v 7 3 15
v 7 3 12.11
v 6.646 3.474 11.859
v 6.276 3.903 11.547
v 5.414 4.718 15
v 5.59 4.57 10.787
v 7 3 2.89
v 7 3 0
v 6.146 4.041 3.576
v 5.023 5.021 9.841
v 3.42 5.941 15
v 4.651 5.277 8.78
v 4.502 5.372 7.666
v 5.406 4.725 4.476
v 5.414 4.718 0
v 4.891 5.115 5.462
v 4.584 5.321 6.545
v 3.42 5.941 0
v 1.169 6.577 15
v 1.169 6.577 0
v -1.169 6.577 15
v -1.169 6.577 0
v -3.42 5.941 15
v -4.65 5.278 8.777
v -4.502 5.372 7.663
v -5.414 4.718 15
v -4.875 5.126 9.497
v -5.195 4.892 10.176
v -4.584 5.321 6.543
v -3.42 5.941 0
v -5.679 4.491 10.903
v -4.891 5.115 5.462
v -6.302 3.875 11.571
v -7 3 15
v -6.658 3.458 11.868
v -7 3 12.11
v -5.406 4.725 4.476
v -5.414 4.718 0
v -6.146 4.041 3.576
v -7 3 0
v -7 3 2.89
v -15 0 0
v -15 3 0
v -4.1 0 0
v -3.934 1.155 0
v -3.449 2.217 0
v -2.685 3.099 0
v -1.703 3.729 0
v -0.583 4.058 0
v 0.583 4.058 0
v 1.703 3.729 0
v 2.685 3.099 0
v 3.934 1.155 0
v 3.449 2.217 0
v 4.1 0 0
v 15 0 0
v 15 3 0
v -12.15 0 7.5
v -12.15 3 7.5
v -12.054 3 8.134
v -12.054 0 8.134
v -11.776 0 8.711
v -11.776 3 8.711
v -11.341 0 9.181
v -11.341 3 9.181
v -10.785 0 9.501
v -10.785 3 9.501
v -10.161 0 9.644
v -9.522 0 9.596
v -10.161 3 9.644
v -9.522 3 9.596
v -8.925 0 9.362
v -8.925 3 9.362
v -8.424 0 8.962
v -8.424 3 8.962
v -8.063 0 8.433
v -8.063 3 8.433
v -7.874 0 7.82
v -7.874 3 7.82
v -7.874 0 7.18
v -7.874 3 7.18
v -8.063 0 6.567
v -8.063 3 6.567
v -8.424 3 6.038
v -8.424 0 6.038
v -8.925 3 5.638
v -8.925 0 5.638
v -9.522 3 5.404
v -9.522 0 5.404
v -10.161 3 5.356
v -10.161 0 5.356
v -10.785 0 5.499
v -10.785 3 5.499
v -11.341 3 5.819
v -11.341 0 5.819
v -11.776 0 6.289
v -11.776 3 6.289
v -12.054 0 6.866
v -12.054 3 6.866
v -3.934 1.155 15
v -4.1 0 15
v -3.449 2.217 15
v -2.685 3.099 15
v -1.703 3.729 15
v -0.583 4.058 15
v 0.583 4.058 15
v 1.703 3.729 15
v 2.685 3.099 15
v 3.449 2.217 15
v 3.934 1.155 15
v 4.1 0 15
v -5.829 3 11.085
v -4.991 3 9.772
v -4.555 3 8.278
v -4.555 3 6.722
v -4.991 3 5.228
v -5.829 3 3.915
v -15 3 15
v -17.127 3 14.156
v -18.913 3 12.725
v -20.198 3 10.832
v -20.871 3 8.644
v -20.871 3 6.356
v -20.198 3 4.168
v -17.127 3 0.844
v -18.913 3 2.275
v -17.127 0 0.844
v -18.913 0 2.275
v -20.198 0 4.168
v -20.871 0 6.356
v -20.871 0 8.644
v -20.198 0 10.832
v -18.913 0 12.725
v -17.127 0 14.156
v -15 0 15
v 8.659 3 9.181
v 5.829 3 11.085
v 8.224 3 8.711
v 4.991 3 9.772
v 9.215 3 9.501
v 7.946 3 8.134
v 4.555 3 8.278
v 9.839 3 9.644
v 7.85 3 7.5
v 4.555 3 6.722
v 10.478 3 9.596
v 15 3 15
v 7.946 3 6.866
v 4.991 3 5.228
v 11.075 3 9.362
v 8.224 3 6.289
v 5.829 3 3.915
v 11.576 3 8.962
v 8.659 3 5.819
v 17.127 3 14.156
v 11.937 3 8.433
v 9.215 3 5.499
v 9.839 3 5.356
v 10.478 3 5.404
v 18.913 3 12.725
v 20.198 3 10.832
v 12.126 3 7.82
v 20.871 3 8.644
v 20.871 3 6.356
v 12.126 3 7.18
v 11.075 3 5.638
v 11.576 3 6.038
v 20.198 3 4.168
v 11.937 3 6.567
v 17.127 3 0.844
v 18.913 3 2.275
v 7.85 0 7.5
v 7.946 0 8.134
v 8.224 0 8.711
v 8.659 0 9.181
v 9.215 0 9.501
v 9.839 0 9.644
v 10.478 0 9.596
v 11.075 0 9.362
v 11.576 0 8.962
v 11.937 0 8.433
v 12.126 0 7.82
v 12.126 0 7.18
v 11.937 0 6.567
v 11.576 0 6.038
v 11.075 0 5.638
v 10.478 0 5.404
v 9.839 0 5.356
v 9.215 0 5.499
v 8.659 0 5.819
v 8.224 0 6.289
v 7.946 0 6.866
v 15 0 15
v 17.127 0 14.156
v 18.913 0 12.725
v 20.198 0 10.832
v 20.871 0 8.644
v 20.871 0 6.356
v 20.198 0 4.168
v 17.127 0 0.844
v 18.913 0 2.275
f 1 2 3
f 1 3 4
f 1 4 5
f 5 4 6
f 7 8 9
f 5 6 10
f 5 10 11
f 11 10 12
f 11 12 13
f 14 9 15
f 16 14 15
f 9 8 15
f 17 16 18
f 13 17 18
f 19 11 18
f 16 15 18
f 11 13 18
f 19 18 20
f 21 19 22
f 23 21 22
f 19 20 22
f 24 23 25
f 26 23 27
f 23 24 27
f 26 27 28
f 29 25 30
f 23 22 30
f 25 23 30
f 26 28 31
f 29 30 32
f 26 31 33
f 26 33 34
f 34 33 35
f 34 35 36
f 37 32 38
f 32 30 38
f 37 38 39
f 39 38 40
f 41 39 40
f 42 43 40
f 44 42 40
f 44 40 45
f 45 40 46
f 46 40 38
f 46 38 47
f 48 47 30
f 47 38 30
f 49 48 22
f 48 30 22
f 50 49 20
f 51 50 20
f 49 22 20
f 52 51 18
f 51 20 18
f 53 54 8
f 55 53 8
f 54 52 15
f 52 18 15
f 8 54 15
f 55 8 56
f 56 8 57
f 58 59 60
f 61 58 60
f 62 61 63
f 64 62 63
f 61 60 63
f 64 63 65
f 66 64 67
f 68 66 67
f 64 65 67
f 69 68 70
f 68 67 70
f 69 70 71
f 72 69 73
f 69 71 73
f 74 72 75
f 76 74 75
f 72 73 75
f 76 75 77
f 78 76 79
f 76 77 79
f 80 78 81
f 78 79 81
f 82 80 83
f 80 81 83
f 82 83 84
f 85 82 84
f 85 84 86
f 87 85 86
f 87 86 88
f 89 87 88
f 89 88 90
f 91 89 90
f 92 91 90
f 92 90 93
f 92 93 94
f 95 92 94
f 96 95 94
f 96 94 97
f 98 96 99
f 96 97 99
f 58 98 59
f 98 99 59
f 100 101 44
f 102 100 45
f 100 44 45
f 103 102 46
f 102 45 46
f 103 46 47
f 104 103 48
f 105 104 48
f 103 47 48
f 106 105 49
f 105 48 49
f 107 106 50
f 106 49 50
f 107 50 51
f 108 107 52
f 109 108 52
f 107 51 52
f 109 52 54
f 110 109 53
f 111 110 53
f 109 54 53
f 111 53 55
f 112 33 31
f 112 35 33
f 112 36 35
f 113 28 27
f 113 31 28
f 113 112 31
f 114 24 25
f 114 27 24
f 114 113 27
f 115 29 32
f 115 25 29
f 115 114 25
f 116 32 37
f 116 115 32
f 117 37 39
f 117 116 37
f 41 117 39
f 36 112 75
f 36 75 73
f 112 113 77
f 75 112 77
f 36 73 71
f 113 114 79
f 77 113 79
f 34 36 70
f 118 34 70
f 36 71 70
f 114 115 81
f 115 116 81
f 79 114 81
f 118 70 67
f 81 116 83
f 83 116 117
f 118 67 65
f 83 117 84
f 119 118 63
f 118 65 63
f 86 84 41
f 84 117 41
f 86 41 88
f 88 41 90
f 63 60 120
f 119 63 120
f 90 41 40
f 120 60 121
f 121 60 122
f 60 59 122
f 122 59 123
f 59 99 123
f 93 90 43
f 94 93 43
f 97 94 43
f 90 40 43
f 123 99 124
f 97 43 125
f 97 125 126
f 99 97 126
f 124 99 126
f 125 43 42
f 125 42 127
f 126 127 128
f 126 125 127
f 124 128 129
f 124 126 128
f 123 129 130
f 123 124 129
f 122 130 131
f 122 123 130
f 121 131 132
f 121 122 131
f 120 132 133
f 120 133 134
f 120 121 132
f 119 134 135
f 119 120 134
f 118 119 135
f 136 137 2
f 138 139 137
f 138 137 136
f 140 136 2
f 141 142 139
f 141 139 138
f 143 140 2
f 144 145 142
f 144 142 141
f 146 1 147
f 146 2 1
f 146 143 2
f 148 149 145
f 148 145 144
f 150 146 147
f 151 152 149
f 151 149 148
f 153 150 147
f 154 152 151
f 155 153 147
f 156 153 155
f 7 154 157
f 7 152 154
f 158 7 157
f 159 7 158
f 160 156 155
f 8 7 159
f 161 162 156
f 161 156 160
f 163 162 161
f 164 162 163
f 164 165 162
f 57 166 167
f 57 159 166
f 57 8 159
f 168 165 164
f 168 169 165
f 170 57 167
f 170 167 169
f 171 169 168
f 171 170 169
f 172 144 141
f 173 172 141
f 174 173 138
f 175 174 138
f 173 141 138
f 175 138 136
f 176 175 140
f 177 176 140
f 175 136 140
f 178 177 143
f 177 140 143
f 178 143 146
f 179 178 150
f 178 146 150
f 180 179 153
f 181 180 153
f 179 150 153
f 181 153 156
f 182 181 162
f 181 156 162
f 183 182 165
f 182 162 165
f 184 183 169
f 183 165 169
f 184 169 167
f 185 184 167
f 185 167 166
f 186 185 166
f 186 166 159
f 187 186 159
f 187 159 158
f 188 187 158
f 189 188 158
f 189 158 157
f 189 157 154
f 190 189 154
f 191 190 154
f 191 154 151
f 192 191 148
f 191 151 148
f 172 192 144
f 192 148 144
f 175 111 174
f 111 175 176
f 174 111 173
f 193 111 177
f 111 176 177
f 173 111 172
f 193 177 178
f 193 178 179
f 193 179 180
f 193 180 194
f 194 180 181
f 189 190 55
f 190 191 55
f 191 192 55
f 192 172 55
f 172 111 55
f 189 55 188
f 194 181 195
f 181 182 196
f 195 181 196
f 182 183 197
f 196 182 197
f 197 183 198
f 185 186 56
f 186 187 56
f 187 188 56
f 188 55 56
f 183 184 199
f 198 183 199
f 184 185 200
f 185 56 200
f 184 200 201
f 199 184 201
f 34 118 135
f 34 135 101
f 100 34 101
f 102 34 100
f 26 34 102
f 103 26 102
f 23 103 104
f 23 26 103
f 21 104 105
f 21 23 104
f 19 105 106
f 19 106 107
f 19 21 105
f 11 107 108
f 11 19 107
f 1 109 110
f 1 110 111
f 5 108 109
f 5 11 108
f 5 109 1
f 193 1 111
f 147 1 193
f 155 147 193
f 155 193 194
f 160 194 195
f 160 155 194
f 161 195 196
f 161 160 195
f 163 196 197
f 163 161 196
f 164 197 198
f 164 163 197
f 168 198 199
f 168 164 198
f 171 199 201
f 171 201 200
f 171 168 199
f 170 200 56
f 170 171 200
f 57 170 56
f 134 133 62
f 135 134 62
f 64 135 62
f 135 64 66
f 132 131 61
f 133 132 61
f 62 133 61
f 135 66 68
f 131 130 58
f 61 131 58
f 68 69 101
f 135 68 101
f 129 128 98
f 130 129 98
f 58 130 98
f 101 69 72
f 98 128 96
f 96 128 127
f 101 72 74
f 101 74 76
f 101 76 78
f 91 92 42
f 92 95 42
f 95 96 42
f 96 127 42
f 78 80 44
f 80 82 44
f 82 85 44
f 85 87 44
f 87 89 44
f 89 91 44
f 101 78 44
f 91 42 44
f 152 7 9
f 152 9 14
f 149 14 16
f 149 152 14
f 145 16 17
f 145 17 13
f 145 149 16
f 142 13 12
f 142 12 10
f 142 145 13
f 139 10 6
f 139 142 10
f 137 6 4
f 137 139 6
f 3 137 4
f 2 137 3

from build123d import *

# Parameters (mm, degrees)
AUFSATZ_LINEAR_AUSTRAGEN1_DEPTH = 15
AUFSATZ_LINEAR_AUSTRAGEN2_DEPTH = 3
SKIZZE3_8_R                     = 5.5
SCHNITT_LINEAR_AUSTRAGEN1_DEPTH = 3
SKIZZE3_9_R                     = 2.15
SCHNITT_LINEAR_AUSTRAGEN2_DEPTH = 3


with BuildPart() as part:
    # Skizze2 → Aufsatz-Linear austragen1 (new body)
    with BuildSketch(Plane.XY):
        with BuildLine():
            ThreePointArc((-4.1, 0), (0, 4.1), (4.1, 0))
            Line((4.1, 0), (10, 0))
            Line((10, 0), (15, 0))
            Line((15, 0), (15, 3))
            Line((15, 3), (7, 3))
            ThreePointArc((7, 3), (0, 6.657308815), (-7, 3))
            Line((-7, 3), (-15, 3))
            Line((-15, 3), (-15, 0))
            Line((-15, 0), (-10, 0))
            Line((-10, 0), (-4.1, 0))
        make_face()
    extrude(amount=AUFSATZ_LINEAR_AUSTRAGEN1_DEPTH)

    # Skizze3 → Aufsatz-Linear austragen2 (add)
    with BuildSketch(Plane(origin=(0, 3, 0), x_dir=(1, 0, 0), z_dir=(0, 1, 0))):
        with BuildLine():
            ThreePointArc((15, -15), (20.956440423, -7.5), (15, 0))
            Line((15, 0), (15, -15))
        make_face()
        with BuildLine():
            Line((-15, -15), (-15, 0))
            ThreePointArc((-15, 0), (-20.956440423, -7.5), (-15, -15))
        make_face()
    extrude(amount=-AUFSATZ_LINEAR_AUSTRAGEN2_DEPTH)

    # Skizze3<8> → Schnitt-Linear austragen1 (cut)
    with BuildSketch(Plane(origin=(0, 3, 0), x_dir=(1, 0, 0), z_dir=(0, 1, 0))):
        with Locations((-10, -7.5)):
            Circle(SKIZZE3_8_R)
        with Locations((10, -7.5)):
            Circle(SKIZZE3_8_R)
    extrude(amount=SCHNITT_LINEAR_AUSTRAGEN1_DEPTH, mode=Mode.SUBTRACT)

    # Skizze3<9> → Schnitt-Linear austragen2 (cut)
    with BuildSketch(Plane(origin=(0, 3, 0), x_dir=(1, 0, 0), z_dir=(0, 1, 0))):
        with Locations(Location((10, -7.5, 0), (0, 0, 180))):
            Circle(SKIZZE3_9_R)
        with Locations(Location((-10, -7.5, 0), (0, 0, 180))):
            Circle(SKIZZE3_9_R)
    extrude(amount=-SCHNITT_LINEAR_AUSTRAGEN2_DEPTH, mode=Mode.SUBTRACT)


solid = part.part
